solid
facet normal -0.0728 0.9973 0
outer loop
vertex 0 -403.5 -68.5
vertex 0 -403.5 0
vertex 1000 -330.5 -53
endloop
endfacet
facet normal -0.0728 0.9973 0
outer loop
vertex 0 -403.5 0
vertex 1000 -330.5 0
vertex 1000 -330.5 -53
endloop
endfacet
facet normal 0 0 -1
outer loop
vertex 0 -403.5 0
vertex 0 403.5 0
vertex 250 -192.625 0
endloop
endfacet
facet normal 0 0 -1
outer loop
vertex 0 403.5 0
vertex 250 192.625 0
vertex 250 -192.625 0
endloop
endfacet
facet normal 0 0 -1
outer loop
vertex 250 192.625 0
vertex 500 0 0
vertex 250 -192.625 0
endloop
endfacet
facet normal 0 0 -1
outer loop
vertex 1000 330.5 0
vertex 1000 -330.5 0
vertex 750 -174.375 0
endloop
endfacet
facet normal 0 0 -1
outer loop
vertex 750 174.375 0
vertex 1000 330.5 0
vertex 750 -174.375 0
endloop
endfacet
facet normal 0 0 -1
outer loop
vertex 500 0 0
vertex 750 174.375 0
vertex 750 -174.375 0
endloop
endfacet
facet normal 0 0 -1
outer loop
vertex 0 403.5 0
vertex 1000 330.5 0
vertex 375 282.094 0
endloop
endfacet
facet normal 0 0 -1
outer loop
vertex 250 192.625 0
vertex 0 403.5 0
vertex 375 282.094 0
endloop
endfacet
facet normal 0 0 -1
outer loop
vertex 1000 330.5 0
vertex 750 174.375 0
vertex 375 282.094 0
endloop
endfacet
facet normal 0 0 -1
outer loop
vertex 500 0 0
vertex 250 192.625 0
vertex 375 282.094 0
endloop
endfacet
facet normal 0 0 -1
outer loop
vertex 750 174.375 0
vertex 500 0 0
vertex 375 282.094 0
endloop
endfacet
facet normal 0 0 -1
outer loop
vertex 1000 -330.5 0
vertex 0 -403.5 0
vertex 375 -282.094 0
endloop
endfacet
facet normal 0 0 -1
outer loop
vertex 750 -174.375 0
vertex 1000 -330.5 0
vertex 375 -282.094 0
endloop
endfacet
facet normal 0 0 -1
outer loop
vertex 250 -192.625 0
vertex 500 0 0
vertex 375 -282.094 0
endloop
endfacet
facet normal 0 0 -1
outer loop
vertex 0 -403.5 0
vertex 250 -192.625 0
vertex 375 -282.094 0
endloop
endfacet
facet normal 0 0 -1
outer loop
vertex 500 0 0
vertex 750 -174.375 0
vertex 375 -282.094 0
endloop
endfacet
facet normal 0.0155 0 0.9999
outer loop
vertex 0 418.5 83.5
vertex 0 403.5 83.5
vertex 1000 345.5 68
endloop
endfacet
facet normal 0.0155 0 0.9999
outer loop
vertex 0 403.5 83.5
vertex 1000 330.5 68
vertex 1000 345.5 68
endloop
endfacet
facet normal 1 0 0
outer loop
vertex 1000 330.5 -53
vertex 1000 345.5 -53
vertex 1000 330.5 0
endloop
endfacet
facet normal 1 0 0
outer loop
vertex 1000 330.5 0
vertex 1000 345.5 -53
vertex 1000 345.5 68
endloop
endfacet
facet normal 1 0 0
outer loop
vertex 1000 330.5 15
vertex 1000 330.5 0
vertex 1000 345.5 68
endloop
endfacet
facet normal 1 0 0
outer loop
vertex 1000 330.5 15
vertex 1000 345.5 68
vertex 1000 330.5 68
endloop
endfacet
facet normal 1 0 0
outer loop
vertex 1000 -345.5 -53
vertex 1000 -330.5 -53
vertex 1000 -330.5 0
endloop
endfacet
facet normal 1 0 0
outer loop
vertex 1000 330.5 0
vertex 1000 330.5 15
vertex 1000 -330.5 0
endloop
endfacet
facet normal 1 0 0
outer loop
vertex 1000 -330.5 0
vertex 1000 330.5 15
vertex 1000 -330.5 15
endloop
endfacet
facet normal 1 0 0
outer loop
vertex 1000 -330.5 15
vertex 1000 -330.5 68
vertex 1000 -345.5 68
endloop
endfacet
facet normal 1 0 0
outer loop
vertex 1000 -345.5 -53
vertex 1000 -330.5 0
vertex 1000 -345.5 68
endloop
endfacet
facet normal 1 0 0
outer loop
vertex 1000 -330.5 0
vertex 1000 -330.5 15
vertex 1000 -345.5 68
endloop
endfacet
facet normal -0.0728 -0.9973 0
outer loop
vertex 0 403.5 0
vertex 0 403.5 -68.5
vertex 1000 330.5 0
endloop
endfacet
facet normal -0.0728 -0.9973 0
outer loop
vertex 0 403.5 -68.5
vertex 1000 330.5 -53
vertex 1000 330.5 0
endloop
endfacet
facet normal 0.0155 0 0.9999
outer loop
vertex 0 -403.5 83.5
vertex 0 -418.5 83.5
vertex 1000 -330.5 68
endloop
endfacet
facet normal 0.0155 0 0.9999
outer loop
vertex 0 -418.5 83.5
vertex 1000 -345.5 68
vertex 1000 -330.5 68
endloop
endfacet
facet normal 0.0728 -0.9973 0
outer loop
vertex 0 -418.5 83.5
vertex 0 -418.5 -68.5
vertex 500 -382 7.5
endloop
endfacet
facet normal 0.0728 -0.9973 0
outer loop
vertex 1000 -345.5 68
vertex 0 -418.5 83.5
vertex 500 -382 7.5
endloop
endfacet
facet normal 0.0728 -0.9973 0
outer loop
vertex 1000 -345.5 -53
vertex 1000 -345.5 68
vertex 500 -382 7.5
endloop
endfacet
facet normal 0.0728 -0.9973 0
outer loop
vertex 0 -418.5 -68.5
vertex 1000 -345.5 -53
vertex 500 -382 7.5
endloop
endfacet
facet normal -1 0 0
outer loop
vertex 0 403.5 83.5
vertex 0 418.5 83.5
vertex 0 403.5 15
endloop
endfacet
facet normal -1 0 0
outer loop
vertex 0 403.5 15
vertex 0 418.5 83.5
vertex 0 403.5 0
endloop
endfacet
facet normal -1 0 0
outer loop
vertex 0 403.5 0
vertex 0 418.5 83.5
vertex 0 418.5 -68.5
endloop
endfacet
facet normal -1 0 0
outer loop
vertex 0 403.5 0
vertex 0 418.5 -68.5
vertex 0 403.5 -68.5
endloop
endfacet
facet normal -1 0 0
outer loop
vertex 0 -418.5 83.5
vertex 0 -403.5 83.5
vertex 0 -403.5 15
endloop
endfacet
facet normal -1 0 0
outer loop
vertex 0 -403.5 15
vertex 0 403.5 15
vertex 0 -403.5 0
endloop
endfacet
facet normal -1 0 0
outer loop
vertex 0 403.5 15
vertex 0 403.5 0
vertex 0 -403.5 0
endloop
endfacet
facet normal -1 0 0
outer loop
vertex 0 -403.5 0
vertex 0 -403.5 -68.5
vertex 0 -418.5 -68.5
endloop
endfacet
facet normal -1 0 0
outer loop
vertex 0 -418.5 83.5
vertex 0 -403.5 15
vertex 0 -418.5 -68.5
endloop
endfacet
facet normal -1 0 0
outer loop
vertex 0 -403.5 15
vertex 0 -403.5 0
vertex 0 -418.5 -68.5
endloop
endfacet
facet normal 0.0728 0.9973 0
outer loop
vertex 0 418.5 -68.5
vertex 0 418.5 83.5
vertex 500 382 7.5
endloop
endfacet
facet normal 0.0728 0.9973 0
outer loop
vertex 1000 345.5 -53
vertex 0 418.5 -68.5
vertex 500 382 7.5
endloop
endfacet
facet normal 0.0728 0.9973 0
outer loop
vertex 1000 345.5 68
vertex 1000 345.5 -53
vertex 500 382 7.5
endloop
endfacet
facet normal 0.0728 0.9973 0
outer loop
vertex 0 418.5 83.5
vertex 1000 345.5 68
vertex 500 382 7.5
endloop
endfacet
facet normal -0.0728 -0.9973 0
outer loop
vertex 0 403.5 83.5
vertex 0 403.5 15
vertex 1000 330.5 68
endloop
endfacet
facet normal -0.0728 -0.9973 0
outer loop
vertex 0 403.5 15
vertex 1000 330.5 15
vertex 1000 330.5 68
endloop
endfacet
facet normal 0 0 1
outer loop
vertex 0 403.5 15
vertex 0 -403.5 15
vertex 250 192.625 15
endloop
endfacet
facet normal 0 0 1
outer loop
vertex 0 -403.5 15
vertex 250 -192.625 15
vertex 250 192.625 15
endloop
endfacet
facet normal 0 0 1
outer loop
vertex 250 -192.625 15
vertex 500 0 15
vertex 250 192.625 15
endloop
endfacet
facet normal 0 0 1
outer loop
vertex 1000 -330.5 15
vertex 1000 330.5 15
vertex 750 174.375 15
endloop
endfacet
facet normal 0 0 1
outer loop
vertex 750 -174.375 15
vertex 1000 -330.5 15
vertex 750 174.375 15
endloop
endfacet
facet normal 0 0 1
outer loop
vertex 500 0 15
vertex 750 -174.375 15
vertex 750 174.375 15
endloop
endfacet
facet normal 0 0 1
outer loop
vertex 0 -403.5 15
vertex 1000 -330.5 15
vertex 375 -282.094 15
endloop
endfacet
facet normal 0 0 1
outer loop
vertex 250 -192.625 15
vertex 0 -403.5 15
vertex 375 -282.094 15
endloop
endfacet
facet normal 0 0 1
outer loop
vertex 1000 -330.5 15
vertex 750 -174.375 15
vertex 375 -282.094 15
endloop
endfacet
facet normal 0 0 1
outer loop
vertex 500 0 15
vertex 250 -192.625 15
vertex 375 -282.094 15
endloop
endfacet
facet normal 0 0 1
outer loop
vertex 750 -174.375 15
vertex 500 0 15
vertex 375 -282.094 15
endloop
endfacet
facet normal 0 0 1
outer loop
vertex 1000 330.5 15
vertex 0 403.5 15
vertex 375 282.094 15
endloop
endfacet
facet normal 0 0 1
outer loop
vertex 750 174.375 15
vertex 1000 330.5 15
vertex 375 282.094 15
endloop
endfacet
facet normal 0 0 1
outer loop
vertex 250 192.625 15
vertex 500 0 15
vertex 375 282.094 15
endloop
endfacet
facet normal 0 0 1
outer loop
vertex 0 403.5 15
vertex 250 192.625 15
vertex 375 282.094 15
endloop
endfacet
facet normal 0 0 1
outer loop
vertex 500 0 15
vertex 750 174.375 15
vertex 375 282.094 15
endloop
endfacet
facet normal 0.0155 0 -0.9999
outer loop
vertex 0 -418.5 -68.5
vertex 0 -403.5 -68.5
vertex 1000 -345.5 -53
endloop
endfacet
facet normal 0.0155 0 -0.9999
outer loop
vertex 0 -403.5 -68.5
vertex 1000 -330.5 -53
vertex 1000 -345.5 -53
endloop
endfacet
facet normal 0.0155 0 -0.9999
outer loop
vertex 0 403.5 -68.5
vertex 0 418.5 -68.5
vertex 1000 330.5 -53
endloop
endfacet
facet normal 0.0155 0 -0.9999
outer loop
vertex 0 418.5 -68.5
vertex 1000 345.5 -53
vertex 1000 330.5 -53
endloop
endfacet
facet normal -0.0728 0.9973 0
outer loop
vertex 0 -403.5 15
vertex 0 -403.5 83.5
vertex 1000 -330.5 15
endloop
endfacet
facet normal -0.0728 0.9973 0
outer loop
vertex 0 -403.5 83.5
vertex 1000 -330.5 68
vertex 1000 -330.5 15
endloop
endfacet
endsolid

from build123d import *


with BuildPart() as part:
    # Sketch1 → Loft l2 section 0
    with BuildSketch(Plane(origin=(0, 0, 0), x_dir=(0, 0, -1), z_dir=(1, 0, 0))):
        Polygon((-83.5, 418.5), (68.5, 418.5), (68.5, 403.5), (0, 403.5), (0, -403.5), (68.5, -403.5), (68.5, -418.5), (-83.5, -418.5), (-83.5, -403.5), (-15, -403.5), (-15, 403.5), (-83.5, 403.5), align=None)
    # Sketch4 → Loft l2 section 1
    with BuildSketch(Plane(origin=(1000, 0, -1000), x_dir=(0, 0, 1), z_dir=(-1, 0, 0))):
        Polygon((947, 345.5), (1068, 345.5), (1068, 330.5), (1015, 330.5), (1015, -330.5), (1068, -330.5), (1068, -345.5), (947, -345.5), (947, -330.5), (1000, -330.5), (1000, 330.5), (947, 330.5), align=None)
    loft()


solid = part.part
